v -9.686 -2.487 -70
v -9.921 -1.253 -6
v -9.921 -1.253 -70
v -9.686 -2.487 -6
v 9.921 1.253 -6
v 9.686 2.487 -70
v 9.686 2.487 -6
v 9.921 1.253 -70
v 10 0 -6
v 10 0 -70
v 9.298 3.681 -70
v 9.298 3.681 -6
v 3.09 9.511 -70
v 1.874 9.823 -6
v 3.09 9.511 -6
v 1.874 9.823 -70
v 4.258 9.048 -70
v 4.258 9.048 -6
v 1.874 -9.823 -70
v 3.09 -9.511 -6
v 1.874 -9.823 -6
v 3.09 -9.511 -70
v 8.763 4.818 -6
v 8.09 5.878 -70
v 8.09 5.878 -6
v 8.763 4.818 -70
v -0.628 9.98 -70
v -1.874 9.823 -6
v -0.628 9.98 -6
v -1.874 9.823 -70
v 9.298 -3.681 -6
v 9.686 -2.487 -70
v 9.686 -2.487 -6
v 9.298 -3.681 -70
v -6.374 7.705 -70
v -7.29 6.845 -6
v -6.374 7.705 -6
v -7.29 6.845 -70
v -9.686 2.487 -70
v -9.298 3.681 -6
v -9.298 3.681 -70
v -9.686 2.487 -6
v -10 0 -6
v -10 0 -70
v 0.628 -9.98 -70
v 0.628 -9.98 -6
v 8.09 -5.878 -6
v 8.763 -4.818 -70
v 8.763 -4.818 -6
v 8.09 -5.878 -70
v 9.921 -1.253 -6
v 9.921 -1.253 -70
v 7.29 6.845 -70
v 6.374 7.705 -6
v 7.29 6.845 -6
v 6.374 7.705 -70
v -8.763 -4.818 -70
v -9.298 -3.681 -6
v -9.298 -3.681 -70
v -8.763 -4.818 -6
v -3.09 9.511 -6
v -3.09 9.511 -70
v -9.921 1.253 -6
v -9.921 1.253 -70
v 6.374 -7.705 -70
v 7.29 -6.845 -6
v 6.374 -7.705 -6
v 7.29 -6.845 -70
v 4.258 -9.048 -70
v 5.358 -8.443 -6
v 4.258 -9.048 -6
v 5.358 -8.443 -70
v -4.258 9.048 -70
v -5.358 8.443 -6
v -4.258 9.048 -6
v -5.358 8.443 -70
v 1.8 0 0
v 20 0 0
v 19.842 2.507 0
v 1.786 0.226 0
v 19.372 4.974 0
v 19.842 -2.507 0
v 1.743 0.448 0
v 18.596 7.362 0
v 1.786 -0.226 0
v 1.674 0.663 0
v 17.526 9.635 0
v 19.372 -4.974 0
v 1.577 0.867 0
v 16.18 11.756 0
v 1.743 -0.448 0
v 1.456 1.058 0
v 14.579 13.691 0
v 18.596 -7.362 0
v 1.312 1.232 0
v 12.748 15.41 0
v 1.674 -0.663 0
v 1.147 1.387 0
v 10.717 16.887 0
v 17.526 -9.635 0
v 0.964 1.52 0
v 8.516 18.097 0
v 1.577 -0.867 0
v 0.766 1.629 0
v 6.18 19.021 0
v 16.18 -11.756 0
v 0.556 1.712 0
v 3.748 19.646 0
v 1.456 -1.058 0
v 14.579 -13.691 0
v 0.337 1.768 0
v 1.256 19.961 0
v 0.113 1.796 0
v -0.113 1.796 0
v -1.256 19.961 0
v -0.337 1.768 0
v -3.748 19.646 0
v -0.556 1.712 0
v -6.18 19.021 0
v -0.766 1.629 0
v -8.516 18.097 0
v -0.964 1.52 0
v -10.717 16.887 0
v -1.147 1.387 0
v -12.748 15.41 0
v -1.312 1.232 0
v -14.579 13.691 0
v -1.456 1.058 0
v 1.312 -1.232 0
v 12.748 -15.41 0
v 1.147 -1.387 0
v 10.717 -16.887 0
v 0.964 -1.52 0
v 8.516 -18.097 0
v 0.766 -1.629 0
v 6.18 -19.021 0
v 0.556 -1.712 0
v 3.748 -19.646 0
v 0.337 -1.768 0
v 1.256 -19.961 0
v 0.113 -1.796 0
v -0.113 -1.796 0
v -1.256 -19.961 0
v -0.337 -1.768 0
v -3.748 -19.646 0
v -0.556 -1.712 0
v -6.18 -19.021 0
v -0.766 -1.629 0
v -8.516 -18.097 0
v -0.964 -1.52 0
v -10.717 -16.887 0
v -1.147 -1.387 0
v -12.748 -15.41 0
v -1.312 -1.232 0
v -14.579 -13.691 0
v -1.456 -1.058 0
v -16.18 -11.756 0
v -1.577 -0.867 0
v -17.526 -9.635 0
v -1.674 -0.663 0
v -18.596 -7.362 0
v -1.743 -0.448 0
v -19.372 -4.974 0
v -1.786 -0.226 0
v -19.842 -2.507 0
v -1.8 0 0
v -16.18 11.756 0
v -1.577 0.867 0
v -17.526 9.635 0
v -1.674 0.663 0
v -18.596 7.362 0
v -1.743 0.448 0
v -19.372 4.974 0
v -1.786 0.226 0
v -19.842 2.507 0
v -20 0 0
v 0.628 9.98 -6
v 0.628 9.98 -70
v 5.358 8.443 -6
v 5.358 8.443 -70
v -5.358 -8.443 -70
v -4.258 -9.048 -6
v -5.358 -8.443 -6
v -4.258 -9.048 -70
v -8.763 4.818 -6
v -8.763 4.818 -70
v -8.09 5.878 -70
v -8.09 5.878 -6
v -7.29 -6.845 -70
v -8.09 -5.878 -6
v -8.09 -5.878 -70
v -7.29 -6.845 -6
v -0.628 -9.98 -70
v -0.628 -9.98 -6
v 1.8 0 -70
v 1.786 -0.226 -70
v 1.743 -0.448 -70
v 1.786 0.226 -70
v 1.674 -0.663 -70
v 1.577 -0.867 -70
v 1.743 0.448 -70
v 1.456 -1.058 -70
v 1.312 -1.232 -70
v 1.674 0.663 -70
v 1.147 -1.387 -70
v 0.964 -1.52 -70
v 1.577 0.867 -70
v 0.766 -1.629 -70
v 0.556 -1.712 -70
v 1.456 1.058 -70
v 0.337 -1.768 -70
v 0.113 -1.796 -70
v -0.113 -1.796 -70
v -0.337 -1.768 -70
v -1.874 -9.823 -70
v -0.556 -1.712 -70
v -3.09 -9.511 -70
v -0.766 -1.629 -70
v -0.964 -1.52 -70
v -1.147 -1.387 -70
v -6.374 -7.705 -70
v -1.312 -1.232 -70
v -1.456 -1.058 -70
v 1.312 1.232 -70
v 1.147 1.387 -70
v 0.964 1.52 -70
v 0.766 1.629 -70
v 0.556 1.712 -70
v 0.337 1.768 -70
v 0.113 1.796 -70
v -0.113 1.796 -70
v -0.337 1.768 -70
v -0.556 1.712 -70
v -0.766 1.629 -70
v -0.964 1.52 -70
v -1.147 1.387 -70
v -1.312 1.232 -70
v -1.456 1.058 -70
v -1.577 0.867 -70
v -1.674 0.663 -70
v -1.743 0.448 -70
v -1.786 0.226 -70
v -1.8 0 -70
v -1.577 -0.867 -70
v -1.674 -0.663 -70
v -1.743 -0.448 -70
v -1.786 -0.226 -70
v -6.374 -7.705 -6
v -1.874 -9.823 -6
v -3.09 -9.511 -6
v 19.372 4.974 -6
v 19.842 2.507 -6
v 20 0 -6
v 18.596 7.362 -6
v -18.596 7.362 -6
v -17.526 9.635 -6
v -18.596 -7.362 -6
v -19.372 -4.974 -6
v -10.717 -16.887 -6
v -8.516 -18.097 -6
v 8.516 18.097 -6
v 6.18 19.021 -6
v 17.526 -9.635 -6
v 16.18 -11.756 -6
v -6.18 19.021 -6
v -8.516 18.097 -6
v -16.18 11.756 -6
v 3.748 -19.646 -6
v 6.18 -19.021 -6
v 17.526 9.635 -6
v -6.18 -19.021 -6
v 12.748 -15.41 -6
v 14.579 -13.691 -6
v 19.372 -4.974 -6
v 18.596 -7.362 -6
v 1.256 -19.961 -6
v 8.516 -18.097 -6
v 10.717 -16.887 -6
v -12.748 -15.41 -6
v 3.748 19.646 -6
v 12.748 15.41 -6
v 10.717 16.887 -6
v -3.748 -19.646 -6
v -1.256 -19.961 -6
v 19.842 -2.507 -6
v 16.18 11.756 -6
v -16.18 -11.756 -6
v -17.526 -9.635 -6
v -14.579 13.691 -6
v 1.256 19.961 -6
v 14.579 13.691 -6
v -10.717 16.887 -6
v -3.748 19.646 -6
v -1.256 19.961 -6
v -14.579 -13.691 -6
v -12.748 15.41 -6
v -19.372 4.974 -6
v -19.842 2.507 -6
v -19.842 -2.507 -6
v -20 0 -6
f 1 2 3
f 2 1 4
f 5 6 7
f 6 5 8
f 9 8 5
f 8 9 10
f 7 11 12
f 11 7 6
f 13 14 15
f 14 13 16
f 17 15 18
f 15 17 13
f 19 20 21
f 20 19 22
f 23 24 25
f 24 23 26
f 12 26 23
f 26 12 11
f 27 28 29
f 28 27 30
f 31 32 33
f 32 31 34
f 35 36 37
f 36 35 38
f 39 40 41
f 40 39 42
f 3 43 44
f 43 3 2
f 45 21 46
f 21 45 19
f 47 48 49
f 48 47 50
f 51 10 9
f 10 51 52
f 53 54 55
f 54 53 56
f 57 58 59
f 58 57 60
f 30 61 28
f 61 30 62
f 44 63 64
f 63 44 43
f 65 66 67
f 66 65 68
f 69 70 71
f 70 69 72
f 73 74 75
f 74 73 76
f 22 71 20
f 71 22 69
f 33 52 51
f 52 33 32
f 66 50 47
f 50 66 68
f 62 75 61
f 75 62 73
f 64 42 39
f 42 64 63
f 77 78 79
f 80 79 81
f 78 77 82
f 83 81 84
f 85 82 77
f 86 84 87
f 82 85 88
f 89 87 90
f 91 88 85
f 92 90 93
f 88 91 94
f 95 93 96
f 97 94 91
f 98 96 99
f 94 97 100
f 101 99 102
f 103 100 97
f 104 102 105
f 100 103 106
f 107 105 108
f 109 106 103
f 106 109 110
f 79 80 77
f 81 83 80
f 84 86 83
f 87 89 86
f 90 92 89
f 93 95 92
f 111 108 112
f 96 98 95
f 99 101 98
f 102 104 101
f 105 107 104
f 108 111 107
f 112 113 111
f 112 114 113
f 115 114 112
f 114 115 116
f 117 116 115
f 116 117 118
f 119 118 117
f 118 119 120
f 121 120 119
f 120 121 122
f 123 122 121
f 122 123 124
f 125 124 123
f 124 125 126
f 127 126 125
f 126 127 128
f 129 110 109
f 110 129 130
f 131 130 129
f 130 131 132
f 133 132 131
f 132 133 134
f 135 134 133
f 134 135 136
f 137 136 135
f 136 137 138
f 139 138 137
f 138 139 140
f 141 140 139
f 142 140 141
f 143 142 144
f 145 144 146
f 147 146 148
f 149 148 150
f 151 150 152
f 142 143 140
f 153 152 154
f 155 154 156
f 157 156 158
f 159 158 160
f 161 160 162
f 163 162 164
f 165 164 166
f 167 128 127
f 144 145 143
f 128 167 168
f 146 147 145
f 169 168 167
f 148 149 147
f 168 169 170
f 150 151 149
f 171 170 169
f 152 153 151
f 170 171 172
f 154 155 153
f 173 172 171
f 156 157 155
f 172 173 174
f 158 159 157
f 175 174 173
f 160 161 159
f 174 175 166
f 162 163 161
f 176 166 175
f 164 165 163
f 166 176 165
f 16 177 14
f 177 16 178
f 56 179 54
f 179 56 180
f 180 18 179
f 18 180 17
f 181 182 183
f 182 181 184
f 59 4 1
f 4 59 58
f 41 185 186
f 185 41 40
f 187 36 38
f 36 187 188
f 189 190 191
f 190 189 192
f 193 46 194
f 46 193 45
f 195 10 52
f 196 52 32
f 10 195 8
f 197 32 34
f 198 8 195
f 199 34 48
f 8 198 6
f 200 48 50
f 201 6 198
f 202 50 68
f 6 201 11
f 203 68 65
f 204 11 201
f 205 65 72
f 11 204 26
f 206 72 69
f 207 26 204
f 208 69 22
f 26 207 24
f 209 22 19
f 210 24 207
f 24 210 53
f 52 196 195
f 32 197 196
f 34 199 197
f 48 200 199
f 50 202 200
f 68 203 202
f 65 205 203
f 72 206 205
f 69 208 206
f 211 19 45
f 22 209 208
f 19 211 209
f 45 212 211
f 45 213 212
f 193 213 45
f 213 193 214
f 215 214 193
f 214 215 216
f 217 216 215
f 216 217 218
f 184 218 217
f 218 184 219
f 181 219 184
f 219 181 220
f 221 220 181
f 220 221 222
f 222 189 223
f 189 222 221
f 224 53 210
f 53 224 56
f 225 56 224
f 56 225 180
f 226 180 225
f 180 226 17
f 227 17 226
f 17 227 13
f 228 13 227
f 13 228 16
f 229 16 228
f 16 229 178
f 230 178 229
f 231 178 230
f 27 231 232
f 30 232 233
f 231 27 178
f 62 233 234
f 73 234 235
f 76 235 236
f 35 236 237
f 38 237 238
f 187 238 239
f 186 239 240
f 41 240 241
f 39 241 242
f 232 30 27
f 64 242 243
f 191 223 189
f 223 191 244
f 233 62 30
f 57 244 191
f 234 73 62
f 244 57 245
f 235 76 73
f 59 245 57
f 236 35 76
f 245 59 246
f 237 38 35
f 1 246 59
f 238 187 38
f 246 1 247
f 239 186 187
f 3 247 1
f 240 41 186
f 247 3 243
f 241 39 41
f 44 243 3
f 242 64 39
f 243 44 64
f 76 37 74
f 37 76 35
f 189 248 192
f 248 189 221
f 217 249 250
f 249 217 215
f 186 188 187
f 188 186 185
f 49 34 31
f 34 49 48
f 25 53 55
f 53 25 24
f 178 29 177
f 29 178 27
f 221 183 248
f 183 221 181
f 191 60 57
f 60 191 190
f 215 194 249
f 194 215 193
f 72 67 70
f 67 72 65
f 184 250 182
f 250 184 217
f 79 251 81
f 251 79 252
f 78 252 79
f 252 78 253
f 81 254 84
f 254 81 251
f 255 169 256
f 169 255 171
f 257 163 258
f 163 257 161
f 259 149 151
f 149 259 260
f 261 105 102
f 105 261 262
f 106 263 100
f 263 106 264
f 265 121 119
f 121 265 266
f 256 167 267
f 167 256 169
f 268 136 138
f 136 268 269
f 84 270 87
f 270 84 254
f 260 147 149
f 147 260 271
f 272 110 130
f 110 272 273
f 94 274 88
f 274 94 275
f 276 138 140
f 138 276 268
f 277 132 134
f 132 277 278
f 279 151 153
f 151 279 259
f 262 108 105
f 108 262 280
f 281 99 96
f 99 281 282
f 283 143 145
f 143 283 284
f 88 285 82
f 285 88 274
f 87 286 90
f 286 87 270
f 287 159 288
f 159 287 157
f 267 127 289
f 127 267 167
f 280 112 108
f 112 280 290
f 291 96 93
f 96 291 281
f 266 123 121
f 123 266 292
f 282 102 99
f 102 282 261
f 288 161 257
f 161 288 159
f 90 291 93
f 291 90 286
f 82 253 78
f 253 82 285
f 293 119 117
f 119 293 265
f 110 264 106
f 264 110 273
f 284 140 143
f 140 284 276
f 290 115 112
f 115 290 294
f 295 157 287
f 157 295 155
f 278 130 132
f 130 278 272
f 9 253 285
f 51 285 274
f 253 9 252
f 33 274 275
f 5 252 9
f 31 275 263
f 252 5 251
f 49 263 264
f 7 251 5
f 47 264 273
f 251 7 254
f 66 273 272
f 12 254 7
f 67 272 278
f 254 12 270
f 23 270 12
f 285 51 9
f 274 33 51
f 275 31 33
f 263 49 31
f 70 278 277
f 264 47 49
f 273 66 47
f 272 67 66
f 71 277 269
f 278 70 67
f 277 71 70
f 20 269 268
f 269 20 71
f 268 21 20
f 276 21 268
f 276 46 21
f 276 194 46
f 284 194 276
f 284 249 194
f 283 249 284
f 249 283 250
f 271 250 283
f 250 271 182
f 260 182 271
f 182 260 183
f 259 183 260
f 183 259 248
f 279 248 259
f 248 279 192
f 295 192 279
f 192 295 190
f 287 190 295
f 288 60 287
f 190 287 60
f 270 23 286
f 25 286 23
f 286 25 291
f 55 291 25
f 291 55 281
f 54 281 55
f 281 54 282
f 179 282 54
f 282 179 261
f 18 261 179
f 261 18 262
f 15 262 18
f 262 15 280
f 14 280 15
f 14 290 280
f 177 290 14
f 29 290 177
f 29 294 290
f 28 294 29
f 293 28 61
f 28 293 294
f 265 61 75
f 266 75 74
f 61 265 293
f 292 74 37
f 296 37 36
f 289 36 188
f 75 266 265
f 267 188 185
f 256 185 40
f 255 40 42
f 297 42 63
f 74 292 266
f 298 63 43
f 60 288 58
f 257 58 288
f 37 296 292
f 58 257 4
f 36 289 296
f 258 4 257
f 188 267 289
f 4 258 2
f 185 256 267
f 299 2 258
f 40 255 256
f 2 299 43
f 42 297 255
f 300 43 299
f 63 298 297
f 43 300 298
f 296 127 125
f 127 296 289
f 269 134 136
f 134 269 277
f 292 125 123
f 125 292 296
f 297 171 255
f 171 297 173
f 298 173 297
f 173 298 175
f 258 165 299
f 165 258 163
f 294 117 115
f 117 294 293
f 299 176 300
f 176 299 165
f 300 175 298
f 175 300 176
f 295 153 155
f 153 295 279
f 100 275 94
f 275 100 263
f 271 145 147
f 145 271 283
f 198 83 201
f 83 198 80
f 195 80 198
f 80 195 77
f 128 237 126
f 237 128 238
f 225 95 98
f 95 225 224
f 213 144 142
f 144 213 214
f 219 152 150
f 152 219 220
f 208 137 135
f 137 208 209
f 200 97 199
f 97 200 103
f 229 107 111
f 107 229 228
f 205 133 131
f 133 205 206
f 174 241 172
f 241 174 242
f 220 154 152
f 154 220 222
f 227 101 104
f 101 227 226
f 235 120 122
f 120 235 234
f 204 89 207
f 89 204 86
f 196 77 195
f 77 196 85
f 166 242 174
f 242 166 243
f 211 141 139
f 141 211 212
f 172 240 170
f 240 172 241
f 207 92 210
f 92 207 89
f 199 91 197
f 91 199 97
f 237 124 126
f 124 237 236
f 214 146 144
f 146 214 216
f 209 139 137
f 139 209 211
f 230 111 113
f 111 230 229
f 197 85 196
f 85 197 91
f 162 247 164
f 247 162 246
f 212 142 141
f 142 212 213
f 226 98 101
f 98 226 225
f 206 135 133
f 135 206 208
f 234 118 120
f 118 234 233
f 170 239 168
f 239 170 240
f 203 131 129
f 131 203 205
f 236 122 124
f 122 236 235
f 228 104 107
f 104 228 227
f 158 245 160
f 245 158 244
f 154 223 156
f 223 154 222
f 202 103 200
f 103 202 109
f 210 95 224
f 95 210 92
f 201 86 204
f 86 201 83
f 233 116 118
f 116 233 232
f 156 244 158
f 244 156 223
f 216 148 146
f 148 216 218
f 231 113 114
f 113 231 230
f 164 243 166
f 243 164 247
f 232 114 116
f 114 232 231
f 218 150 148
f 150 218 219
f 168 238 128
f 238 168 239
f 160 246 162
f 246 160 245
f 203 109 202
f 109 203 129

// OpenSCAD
$fn = 50;


difference() {
	union() {
		translate(v = [0, 0, -70.0000000000]) {
			cylinder(h = 70, r = 10.0000000000);
		}
		translate(v = [0, 0, -6.0000000000]) {
			cylinder(h = 6, r = 20.0000000000);
		}
	}
	union() {
		#translate(v = [0, 0, -70]) {
			cylinder(h = 70, r = 1.8000000000);
		}
	}
}
